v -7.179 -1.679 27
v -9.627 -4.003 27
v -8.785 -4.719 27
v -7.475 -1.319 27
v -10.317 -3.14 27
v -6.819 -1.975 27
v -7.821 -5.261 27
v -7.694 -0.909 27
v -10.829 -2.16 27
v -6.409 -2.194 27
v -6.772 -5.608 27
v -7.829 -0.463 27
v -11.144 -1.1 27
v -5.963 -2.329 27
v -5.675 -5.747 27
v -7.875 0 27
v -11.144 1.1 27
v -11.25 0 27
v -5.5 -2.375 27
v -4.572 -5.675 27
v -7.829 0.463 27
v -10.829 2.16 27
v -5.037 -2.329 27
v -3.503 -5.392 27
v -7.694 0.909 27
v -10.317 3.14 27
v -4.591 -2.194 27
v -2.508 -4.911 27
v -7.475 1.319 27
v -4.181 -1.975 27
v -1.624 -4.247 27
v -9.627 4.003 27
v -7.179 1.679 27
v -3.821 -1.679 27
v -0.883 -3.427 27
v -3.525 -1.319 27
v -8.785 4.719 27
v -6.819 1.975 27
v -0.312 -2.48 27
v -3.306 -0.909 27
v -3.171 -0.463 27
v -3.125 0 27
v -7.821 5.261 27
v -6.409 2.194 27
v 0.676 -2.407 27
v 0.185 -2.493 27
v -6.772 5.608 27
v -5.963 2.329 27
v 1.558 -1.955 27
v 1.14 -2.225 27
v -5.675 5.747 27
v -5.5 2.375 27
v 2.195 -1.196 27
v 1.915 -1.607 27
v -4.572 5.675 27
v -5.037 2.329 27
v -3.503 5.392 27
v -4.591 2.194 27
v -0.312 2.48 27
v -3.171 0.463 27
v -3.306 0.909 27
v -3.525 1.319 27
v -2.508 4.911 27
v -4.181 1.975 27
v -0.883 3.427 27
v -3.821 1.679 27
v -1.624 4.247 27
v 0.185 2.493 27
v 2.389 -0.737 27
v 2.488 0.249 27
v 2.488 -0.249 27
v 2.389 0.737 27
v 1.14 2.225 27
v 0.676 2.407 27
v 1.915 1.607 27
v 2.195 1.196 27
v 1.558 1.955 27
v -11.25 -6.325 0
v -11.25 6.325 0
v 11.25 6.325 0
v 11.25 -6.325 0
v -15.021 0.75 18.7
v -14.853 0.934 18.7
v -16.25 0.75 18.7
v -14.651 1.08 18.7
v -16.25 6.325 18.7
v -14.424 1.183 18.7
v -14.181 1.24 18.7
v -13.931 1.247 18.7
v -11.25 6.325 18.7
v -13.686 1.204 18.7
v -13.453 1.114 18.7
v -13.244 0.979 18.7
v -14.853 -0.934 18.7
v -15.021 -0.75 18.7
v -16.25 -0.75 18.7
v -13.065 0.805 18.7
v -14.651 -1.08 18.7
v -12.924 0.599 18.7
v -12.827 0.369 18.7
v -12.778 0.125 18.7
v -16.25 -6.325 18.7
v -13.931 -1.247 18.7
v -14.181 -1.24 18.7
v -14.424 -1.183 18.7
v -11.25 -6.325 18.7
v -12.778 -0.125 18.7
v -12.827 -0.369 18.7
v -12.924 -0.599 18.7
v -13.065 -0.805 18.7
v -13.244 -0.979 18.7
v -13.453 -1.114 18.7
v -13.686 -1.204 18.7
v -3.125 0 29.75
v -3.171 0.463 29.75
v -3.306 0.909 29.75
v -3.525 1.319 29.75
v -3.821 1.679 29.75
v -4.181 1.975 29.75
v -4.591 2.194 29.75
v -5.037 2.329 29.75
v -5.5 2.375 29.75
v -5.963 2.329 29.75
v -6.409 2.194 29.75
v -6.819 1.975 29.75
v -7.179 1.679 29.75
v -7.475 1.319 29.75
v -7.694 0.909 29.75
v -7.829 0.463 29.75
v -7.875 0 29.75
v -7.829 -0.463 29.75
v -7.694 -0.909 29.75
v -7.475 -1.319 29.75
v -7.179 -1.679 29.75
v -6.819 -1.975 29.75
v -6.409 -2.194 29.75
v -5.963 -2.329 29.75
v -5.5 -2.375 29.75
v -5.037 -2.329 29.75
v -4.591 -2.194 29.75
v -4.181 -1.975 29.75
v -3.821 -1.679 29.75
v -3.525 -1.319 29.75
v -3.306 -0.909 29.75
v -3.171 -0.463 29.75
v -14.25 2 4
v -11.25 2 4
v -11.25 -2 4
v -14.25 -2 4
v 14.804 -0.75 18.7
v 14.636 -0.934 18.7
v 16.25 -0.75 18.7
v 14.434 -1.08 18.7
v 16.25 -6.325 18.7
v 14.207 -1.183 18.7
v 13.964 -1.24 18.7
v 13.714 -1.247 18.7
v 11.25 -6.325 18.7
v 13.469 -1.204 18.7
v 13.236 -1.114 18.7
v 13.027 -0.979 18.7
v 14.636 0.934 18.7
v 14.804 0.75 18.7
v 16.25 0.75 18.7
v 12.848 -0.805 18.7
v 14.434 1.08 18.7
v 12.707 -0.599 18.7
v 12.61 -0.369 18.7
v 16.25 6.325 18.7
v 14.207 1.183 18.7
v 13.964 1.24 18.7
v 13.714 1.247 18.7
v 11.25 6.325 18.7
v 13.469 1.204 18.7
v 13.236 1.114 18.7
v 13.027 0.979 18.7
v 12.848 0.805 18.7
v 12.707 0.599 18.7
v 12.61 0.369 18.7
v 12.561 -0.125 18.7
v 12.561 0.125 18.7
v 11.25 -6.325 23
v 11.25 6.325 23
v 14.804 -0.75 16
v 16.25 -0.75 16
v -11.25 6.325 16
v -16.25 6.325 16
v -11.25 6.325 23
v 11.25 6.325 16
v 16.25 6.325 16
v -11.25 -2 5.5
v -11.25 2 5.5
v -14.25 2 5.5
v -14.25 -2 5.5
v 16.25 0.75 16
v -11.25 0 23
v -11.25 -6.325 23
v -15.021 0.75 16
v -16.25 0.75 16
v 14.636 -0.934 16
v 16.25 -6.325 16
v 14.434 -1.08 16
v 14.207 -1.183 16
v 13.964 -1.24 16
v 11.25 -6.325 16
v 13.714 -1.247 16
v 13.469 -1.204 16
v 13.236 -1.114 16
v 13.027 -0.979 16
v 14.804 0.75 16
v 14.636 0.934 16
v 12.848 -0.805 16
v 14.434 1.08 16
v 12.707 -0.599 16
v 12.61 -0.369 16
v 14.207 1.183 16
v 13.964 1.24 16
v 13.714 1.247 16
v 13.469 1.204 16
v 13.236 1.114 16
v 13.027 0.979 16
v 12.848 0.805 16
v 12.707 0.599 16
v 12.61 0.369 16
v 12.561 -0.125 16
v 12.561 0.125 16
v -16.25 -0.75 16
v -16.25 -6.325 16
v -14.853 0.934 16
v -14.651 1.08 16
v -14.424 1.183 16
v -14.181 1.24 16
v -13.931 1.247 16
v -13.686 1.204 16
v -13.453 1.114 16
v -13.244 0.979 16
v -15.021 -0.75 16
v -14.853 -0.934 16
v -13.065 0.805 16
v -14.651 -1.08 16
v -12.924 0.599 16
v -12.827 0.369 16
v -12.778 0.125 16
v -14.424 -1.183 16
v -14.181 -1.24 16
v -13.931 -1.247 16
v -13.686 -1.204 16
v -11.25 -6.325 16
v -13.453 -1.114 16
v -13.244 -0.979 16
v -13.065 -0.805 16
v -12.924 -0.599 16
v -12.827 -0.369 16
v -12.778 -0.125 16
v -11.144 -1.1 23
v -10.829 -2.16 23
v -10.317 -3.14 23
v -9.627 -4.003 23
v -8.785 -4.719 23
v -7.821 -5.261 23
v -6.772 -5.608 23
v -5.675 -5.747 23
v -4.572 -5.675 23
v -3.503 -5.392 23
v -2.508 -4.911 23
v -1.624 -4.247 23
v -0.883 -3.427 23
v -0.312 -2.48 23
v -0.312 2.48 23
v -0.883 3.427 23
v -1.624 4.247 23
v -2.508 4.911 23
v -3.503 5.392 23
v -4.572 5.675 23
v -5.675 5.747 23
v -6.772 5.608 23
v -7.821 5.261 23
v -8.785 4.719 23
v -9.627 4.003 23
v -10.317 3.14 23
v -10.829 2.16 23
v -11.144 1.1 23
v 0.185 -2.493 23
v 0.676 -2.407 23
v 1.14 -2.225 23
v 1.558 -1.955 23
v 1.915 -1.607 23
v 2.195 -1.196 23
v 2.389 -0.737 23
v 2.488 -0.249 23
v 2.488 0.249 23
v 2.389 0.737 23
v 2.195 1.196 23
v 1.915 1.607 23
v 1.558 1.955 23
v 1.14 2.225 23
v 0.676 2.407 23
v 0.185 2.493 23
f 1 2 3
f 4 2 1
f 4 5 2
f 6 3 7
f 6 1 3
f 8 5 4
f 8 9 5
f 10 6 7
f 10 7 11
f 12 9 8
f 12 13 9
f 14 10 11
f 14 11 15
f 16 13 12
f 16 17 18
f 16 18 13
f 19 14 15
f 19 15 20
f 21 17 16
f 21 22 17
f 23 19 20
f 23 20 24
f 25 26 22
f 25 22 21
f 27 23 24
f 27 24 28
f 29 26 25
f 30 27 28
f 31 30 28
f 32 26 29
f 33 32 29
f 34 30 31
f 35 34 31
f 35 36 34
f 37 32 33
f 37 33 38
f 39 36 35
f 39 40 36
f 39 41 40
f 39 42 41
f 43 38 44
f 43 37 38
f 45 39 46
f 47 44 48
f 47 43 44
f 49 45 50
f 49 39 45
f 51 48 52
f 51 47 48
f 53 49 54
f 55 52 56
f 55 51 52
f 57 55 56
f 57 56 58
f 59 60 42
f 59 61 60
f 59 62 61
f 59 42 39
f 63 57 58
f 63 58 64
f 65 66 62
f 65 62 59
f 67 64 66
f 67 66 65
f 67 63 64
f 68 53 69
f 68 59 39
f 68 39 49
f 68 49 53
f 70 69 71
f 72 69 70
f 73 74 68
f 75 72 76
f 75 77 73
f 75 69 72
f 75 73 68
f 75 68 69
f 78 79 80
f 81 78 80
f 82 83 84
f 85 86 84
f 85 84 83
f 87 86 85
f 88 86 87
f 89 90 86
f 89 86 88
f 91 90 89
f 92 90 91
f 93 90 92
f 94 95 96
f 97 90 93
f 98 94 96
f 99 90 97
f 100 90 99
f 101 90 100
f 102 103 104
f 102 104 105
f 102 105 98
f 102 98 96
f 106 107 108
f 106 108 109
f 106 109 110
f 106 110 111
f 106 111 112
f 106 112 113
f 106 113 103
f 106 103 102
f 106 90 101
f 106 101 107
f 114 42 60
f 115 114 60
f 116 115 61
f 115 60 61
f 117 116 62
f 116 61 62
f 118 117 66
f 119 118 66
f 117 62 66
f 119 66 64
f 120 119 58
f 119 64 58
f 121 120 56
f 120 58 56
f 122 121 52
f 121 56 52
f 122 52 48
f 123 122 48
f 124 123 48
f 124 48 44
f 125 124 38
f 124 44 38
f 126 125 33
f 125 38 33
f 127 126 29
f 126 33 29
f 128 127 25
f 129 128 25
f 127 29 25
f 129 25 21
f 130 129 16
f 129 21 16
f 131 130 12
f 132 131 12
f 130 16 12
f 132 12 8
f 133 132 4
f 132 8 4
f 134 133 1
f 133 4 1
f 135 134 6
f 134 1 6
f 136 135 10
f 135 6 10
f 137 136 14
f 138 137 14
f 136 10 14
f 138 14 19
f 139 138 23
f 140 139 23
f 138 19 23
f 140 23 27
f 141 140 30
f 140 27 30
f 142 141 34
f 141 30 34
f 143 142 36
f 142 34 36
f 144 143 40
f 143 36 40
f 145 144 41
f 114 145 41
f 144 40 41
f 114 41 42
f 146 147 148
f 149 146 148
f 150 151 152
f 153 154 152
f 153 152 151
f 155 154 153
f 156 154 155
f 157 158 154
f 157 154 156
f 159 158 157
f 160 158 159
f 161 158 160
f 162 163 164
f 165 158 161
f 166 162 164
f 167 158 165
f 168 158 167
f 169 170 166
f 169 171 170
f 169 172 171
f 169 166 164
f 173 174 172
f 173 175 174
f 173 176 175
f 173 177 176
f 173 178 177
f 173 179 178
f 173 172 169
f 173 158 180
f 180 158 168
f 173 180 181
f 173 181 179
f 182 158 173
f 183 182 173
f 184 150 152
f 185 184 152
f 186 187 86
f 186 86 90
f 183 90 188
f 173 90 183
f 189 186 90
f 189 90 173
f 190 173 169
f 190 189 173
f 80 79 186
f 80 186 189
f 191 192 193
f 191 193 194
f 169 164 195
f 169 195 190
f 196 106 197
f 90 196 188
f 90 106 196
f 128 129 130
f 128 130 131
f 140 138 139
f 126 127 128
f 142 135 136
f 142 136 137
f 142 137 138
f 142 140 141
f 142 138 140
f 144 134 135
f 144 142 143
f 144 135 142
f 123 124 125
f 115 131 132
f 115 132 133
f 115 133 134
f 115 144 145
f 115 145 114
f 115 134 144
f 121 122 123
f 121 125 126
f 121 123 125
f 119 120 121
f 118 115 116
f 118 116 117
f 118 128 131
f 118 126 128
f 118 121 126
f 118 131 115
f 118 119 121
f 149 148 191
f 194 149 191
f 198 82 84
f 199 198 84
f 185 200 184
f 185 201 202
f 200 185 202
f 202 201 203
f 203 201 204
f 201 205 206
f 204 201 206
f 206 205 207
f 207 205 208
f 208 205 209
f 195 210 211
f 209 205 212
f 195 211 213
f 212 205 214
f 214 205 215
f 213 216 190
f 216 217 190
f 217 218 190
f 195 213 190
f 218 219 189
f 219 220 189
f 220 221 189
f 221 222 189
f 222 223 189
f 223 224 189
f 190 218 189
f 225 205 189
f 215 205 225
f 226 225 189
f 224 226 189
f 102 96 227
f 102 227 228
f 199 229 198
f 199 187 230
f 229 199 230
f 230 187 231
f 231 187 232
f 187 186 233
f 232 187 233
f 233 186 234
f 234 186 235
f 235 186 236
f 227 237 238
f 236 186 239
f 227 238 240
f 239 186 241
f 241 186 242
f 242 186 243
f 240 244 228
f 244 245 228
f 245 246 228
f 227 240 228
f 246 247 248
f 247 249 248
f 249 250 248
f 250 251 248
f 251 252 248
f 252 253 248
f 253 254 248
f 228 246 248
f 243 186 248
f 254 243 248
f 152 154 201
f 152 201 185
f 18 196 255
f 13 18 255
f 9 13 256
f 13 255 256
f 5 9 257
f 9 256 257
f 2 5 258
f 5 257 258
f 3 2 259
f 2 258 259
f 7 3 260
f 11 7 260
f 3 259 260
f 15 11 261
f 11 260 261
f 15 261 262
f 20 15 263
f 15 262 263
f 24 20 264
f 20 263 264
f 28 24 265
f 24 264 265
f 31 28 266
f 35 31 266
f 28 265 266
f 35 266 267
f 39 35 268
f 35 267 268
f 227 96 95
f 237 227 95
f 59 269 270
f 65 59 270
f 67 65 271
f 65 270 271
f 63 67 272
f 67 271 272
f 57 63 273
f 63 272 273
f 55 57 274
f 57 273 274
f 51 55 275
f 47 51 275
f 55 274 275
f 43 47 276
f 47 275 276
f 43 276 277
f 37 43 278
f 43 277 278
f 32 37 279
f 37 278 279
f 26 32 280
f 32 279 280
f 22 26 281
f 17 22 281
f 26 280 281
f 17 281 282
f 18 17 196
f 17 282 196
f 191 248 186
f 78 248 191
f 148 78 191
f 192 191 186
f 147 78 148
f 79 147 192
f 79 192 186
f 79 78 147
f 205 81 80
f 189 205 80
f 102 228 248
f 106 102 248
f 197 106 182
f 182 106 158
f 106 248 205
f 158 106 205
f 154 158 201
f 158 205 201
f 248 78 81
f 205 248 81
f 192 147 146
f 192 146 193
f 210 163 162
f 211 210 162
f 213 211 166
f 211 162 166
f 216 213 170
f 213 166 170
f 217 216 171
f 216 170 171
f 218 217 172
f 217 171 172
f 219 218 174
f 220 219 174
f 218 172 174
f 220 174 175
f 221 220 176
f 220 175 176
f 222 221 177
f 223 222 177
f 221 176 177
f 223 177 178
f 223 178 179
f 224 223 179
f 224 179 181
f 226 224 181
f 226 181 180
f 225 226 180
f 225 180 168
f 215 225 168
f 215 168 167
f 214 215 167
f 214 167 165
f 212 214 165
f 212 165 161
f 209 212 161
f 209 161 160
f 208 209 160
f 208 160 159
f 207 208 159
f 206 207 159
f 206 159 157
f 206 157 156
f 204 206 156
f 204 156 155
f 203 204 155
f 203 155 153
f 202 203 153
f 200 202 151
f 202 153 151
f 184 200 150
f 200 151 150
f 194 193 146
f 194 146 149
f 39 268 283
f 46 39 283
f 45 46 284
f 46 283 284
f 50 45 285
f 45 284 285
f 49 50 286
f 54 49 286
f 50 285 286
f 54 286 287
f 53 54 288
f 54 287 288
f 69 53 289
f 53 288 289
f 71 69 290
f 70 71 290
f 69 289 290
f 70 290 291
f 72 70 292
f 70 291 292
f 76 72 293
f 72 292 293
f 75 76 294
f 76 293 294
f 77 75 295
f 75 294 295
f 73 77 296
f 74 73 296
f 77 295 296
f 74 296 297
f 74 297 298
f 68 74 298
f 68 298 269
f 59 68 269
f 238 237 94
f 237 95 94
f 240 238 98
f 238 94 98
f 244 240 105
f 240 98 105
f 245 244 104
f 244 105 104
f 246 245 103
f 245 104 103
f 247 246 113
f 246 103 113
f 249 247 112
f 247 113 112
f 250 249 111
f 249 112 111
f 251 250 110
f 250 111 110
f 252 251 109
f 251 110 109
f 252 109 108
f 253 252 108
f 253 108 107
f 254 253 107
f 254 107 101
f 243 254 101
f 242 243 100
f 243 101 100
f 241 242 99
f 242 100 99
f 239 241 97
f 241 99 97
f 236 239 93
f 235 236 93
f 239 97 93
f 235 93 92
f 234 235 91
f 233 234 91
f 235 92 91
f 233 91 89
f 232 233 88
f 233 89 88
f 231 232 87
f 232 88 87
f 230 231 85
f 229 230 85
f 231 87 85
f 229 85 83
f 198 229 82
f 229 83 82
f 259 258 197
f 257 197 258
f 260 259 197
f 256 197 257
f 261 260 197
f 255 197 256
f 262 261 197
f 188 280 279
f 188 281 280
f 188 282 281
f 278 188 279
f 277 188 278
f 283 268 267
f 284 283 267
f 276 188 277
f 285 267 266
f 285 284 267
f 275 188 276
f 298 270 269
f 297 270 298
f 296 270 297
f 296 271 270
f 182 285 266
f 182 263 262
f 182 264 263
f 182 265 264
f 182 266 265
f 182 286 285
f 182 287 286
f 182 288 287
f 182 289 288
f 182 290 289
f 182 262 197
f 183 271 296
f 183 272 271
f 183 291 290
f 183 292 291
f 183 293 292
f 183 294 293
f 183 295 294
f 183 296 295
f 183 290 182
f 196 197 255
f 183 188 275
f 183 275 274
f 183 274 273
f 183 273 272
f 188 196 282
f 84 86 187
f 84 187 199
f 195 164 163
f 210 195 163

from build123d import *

# Parameters (mm, degrees)
F0_W      = 22.5
F0_H      = 12.65
F1_DEPTH  = 23
F2_W      = 12.65
F2_H      = 2.7
F3_DEPTH  = 5
F4_W      = 4
F4_H      = 1.5
F5_DEPTH  = 3
F6_R      = 1.25
F7_DEPTH  = 2.7
F8_W      = 12.65
F8_H      = 2.7
F9_DEPTH  = 5
F10_R     = 1.25
F11_DEPTH = 2.7
F12_R     = 2.375
F13_DEPTH = 4
F14_R     = 2.375
F15_DEPTH = 2.75
F17_DEPTH = 2.7
F19_DEPTH = 2.7


with BuildPart() as f1:
    # F0 (on Top) → F1 (new body)
    with BuildSketch(Plane.XY):
        Rectangle(F0_W, F0_H)
    extrude(amount=F1_DEPTH)

    # F2 (on face) → F3 (join)
    with BuildSketch(Plane(origin=(-11.25, 0, 0), x_dir=(0, -1, 0), z_dir=(-1, 0, 0))):
        with Locations((0, 17.35)):
            Rectangle(F2_W, F2_H)
    extrude(amount=F3_DEPTH)

    # F4 (on face) → F5 (join)
    with BuildSketch(Plane(origin=(-11.25, 0, 0), x_dir=(0, -1, 0), z_dir=(-1, 0, 0))):
        with Locations((0, 4.75)):
            Rectangle(F4_W, F4_H)
    extrude(amount=F5_DEPTH)

    # F6 (on face) → F7 (cut, through all)
    with BuildSketch(Plane.XY.offset(18.7)):
        with Locations((-14.0213416889, 0)):
            Circle(F6_R)
    extrude(amount=-F7_DEPTH, mode=Mode.SUBTRACT)

    # F8 (on face) → F9 (join)
    with BuildSketch(Plane.YZ.offset(11.25)):
        with Locations((0, 17.35)):
            Rectangle(F8_W, F8_H)
    extrude(amount=F9_DEPTH)

    # F10 (on face) → F11 (cut, through all)
    with BuildSketch(Plane.XY.offset(18.7)):
        with Locations((13.8043416664, 0)):
            Circle(F10_R)
    extrude(amount=-F11_DEPTH, mode=Mode.SUBTRACT)

    # F12 (on face) → F13 (join)
    with BuildSketch(Plane.XY.offset(23)):
        with BuildLine():
            ThreePointArc((-0.3125, -2.4803918541), (2.5, 0), (-0.3125, 2.4803918541))
            ThreePointArc((-0.3125, 2.4803918541), (-6.7716868718, 5.607612014), (-11.25, 0))
            ThreePointArc((-11.25, 0), (-6.7716868718, -5.607612014), (-0.3125, -2.4803918541))
        make_face()
        with Locations((-5.5, 0)):
            Circle(F12_R, mode=Mode.SUBTRACT)
        with Locations((-5.5, 0)):
            Circle(F12_R)
    extrude(amount=F13_DEPTH)

    # F14 (on face) → F15 (join)
    with BuildSketch(Plane.XY.offset(27)):
        with Locations((-5.5, 0)):
            Circle(F14_R)
    extrude(amount=F15_DEPTH)

    # F16 (on face) → F17 (cut, through all)
    with BuildSketch(Plane.XY.offset(18.7)):
        with BuildLine():
            Line((16.25, 0.75), (14.8043416664, 0.75))
            ThreePointArc((14.8043416664, 0.75), (14.990195789, 0.3952847075), (15.0543416664, 0))
            ThreePointArc((15.0543416664, 0), (14.990195789, -0.3952847075), (14.8043416664, -0.75))
            Line((14.8043416664, -0.75), (16.25, -0.75))
            Line((16.25, -0.75), (16.25, 0.75))
        make_face()
    extrude(amount=-F17_DEPTH, mode=Mode.SUBTRACT)

    # F18 (on face) → F19 (cut, through all)
    with BuildSketch(Plane.XY.offset(18.7)):
        with BuildLine():
            Line((-15.0213416889, 0.75), (-16.25, 0.75))
            Line((-16.25, 0.75), (-16.25, -0.75))
            Line((-16.25, -0.75), (-15.0213416889, -0.75))
            ThreePointArc((-15.0213416889, -0.75), (-15.2713416889, 0), (-15.0213416889, 0.75))
        make_face()
    extrude(amount=-F19_DEPTH, mode=Mode.SUBTRACT)


solid = f1.part
